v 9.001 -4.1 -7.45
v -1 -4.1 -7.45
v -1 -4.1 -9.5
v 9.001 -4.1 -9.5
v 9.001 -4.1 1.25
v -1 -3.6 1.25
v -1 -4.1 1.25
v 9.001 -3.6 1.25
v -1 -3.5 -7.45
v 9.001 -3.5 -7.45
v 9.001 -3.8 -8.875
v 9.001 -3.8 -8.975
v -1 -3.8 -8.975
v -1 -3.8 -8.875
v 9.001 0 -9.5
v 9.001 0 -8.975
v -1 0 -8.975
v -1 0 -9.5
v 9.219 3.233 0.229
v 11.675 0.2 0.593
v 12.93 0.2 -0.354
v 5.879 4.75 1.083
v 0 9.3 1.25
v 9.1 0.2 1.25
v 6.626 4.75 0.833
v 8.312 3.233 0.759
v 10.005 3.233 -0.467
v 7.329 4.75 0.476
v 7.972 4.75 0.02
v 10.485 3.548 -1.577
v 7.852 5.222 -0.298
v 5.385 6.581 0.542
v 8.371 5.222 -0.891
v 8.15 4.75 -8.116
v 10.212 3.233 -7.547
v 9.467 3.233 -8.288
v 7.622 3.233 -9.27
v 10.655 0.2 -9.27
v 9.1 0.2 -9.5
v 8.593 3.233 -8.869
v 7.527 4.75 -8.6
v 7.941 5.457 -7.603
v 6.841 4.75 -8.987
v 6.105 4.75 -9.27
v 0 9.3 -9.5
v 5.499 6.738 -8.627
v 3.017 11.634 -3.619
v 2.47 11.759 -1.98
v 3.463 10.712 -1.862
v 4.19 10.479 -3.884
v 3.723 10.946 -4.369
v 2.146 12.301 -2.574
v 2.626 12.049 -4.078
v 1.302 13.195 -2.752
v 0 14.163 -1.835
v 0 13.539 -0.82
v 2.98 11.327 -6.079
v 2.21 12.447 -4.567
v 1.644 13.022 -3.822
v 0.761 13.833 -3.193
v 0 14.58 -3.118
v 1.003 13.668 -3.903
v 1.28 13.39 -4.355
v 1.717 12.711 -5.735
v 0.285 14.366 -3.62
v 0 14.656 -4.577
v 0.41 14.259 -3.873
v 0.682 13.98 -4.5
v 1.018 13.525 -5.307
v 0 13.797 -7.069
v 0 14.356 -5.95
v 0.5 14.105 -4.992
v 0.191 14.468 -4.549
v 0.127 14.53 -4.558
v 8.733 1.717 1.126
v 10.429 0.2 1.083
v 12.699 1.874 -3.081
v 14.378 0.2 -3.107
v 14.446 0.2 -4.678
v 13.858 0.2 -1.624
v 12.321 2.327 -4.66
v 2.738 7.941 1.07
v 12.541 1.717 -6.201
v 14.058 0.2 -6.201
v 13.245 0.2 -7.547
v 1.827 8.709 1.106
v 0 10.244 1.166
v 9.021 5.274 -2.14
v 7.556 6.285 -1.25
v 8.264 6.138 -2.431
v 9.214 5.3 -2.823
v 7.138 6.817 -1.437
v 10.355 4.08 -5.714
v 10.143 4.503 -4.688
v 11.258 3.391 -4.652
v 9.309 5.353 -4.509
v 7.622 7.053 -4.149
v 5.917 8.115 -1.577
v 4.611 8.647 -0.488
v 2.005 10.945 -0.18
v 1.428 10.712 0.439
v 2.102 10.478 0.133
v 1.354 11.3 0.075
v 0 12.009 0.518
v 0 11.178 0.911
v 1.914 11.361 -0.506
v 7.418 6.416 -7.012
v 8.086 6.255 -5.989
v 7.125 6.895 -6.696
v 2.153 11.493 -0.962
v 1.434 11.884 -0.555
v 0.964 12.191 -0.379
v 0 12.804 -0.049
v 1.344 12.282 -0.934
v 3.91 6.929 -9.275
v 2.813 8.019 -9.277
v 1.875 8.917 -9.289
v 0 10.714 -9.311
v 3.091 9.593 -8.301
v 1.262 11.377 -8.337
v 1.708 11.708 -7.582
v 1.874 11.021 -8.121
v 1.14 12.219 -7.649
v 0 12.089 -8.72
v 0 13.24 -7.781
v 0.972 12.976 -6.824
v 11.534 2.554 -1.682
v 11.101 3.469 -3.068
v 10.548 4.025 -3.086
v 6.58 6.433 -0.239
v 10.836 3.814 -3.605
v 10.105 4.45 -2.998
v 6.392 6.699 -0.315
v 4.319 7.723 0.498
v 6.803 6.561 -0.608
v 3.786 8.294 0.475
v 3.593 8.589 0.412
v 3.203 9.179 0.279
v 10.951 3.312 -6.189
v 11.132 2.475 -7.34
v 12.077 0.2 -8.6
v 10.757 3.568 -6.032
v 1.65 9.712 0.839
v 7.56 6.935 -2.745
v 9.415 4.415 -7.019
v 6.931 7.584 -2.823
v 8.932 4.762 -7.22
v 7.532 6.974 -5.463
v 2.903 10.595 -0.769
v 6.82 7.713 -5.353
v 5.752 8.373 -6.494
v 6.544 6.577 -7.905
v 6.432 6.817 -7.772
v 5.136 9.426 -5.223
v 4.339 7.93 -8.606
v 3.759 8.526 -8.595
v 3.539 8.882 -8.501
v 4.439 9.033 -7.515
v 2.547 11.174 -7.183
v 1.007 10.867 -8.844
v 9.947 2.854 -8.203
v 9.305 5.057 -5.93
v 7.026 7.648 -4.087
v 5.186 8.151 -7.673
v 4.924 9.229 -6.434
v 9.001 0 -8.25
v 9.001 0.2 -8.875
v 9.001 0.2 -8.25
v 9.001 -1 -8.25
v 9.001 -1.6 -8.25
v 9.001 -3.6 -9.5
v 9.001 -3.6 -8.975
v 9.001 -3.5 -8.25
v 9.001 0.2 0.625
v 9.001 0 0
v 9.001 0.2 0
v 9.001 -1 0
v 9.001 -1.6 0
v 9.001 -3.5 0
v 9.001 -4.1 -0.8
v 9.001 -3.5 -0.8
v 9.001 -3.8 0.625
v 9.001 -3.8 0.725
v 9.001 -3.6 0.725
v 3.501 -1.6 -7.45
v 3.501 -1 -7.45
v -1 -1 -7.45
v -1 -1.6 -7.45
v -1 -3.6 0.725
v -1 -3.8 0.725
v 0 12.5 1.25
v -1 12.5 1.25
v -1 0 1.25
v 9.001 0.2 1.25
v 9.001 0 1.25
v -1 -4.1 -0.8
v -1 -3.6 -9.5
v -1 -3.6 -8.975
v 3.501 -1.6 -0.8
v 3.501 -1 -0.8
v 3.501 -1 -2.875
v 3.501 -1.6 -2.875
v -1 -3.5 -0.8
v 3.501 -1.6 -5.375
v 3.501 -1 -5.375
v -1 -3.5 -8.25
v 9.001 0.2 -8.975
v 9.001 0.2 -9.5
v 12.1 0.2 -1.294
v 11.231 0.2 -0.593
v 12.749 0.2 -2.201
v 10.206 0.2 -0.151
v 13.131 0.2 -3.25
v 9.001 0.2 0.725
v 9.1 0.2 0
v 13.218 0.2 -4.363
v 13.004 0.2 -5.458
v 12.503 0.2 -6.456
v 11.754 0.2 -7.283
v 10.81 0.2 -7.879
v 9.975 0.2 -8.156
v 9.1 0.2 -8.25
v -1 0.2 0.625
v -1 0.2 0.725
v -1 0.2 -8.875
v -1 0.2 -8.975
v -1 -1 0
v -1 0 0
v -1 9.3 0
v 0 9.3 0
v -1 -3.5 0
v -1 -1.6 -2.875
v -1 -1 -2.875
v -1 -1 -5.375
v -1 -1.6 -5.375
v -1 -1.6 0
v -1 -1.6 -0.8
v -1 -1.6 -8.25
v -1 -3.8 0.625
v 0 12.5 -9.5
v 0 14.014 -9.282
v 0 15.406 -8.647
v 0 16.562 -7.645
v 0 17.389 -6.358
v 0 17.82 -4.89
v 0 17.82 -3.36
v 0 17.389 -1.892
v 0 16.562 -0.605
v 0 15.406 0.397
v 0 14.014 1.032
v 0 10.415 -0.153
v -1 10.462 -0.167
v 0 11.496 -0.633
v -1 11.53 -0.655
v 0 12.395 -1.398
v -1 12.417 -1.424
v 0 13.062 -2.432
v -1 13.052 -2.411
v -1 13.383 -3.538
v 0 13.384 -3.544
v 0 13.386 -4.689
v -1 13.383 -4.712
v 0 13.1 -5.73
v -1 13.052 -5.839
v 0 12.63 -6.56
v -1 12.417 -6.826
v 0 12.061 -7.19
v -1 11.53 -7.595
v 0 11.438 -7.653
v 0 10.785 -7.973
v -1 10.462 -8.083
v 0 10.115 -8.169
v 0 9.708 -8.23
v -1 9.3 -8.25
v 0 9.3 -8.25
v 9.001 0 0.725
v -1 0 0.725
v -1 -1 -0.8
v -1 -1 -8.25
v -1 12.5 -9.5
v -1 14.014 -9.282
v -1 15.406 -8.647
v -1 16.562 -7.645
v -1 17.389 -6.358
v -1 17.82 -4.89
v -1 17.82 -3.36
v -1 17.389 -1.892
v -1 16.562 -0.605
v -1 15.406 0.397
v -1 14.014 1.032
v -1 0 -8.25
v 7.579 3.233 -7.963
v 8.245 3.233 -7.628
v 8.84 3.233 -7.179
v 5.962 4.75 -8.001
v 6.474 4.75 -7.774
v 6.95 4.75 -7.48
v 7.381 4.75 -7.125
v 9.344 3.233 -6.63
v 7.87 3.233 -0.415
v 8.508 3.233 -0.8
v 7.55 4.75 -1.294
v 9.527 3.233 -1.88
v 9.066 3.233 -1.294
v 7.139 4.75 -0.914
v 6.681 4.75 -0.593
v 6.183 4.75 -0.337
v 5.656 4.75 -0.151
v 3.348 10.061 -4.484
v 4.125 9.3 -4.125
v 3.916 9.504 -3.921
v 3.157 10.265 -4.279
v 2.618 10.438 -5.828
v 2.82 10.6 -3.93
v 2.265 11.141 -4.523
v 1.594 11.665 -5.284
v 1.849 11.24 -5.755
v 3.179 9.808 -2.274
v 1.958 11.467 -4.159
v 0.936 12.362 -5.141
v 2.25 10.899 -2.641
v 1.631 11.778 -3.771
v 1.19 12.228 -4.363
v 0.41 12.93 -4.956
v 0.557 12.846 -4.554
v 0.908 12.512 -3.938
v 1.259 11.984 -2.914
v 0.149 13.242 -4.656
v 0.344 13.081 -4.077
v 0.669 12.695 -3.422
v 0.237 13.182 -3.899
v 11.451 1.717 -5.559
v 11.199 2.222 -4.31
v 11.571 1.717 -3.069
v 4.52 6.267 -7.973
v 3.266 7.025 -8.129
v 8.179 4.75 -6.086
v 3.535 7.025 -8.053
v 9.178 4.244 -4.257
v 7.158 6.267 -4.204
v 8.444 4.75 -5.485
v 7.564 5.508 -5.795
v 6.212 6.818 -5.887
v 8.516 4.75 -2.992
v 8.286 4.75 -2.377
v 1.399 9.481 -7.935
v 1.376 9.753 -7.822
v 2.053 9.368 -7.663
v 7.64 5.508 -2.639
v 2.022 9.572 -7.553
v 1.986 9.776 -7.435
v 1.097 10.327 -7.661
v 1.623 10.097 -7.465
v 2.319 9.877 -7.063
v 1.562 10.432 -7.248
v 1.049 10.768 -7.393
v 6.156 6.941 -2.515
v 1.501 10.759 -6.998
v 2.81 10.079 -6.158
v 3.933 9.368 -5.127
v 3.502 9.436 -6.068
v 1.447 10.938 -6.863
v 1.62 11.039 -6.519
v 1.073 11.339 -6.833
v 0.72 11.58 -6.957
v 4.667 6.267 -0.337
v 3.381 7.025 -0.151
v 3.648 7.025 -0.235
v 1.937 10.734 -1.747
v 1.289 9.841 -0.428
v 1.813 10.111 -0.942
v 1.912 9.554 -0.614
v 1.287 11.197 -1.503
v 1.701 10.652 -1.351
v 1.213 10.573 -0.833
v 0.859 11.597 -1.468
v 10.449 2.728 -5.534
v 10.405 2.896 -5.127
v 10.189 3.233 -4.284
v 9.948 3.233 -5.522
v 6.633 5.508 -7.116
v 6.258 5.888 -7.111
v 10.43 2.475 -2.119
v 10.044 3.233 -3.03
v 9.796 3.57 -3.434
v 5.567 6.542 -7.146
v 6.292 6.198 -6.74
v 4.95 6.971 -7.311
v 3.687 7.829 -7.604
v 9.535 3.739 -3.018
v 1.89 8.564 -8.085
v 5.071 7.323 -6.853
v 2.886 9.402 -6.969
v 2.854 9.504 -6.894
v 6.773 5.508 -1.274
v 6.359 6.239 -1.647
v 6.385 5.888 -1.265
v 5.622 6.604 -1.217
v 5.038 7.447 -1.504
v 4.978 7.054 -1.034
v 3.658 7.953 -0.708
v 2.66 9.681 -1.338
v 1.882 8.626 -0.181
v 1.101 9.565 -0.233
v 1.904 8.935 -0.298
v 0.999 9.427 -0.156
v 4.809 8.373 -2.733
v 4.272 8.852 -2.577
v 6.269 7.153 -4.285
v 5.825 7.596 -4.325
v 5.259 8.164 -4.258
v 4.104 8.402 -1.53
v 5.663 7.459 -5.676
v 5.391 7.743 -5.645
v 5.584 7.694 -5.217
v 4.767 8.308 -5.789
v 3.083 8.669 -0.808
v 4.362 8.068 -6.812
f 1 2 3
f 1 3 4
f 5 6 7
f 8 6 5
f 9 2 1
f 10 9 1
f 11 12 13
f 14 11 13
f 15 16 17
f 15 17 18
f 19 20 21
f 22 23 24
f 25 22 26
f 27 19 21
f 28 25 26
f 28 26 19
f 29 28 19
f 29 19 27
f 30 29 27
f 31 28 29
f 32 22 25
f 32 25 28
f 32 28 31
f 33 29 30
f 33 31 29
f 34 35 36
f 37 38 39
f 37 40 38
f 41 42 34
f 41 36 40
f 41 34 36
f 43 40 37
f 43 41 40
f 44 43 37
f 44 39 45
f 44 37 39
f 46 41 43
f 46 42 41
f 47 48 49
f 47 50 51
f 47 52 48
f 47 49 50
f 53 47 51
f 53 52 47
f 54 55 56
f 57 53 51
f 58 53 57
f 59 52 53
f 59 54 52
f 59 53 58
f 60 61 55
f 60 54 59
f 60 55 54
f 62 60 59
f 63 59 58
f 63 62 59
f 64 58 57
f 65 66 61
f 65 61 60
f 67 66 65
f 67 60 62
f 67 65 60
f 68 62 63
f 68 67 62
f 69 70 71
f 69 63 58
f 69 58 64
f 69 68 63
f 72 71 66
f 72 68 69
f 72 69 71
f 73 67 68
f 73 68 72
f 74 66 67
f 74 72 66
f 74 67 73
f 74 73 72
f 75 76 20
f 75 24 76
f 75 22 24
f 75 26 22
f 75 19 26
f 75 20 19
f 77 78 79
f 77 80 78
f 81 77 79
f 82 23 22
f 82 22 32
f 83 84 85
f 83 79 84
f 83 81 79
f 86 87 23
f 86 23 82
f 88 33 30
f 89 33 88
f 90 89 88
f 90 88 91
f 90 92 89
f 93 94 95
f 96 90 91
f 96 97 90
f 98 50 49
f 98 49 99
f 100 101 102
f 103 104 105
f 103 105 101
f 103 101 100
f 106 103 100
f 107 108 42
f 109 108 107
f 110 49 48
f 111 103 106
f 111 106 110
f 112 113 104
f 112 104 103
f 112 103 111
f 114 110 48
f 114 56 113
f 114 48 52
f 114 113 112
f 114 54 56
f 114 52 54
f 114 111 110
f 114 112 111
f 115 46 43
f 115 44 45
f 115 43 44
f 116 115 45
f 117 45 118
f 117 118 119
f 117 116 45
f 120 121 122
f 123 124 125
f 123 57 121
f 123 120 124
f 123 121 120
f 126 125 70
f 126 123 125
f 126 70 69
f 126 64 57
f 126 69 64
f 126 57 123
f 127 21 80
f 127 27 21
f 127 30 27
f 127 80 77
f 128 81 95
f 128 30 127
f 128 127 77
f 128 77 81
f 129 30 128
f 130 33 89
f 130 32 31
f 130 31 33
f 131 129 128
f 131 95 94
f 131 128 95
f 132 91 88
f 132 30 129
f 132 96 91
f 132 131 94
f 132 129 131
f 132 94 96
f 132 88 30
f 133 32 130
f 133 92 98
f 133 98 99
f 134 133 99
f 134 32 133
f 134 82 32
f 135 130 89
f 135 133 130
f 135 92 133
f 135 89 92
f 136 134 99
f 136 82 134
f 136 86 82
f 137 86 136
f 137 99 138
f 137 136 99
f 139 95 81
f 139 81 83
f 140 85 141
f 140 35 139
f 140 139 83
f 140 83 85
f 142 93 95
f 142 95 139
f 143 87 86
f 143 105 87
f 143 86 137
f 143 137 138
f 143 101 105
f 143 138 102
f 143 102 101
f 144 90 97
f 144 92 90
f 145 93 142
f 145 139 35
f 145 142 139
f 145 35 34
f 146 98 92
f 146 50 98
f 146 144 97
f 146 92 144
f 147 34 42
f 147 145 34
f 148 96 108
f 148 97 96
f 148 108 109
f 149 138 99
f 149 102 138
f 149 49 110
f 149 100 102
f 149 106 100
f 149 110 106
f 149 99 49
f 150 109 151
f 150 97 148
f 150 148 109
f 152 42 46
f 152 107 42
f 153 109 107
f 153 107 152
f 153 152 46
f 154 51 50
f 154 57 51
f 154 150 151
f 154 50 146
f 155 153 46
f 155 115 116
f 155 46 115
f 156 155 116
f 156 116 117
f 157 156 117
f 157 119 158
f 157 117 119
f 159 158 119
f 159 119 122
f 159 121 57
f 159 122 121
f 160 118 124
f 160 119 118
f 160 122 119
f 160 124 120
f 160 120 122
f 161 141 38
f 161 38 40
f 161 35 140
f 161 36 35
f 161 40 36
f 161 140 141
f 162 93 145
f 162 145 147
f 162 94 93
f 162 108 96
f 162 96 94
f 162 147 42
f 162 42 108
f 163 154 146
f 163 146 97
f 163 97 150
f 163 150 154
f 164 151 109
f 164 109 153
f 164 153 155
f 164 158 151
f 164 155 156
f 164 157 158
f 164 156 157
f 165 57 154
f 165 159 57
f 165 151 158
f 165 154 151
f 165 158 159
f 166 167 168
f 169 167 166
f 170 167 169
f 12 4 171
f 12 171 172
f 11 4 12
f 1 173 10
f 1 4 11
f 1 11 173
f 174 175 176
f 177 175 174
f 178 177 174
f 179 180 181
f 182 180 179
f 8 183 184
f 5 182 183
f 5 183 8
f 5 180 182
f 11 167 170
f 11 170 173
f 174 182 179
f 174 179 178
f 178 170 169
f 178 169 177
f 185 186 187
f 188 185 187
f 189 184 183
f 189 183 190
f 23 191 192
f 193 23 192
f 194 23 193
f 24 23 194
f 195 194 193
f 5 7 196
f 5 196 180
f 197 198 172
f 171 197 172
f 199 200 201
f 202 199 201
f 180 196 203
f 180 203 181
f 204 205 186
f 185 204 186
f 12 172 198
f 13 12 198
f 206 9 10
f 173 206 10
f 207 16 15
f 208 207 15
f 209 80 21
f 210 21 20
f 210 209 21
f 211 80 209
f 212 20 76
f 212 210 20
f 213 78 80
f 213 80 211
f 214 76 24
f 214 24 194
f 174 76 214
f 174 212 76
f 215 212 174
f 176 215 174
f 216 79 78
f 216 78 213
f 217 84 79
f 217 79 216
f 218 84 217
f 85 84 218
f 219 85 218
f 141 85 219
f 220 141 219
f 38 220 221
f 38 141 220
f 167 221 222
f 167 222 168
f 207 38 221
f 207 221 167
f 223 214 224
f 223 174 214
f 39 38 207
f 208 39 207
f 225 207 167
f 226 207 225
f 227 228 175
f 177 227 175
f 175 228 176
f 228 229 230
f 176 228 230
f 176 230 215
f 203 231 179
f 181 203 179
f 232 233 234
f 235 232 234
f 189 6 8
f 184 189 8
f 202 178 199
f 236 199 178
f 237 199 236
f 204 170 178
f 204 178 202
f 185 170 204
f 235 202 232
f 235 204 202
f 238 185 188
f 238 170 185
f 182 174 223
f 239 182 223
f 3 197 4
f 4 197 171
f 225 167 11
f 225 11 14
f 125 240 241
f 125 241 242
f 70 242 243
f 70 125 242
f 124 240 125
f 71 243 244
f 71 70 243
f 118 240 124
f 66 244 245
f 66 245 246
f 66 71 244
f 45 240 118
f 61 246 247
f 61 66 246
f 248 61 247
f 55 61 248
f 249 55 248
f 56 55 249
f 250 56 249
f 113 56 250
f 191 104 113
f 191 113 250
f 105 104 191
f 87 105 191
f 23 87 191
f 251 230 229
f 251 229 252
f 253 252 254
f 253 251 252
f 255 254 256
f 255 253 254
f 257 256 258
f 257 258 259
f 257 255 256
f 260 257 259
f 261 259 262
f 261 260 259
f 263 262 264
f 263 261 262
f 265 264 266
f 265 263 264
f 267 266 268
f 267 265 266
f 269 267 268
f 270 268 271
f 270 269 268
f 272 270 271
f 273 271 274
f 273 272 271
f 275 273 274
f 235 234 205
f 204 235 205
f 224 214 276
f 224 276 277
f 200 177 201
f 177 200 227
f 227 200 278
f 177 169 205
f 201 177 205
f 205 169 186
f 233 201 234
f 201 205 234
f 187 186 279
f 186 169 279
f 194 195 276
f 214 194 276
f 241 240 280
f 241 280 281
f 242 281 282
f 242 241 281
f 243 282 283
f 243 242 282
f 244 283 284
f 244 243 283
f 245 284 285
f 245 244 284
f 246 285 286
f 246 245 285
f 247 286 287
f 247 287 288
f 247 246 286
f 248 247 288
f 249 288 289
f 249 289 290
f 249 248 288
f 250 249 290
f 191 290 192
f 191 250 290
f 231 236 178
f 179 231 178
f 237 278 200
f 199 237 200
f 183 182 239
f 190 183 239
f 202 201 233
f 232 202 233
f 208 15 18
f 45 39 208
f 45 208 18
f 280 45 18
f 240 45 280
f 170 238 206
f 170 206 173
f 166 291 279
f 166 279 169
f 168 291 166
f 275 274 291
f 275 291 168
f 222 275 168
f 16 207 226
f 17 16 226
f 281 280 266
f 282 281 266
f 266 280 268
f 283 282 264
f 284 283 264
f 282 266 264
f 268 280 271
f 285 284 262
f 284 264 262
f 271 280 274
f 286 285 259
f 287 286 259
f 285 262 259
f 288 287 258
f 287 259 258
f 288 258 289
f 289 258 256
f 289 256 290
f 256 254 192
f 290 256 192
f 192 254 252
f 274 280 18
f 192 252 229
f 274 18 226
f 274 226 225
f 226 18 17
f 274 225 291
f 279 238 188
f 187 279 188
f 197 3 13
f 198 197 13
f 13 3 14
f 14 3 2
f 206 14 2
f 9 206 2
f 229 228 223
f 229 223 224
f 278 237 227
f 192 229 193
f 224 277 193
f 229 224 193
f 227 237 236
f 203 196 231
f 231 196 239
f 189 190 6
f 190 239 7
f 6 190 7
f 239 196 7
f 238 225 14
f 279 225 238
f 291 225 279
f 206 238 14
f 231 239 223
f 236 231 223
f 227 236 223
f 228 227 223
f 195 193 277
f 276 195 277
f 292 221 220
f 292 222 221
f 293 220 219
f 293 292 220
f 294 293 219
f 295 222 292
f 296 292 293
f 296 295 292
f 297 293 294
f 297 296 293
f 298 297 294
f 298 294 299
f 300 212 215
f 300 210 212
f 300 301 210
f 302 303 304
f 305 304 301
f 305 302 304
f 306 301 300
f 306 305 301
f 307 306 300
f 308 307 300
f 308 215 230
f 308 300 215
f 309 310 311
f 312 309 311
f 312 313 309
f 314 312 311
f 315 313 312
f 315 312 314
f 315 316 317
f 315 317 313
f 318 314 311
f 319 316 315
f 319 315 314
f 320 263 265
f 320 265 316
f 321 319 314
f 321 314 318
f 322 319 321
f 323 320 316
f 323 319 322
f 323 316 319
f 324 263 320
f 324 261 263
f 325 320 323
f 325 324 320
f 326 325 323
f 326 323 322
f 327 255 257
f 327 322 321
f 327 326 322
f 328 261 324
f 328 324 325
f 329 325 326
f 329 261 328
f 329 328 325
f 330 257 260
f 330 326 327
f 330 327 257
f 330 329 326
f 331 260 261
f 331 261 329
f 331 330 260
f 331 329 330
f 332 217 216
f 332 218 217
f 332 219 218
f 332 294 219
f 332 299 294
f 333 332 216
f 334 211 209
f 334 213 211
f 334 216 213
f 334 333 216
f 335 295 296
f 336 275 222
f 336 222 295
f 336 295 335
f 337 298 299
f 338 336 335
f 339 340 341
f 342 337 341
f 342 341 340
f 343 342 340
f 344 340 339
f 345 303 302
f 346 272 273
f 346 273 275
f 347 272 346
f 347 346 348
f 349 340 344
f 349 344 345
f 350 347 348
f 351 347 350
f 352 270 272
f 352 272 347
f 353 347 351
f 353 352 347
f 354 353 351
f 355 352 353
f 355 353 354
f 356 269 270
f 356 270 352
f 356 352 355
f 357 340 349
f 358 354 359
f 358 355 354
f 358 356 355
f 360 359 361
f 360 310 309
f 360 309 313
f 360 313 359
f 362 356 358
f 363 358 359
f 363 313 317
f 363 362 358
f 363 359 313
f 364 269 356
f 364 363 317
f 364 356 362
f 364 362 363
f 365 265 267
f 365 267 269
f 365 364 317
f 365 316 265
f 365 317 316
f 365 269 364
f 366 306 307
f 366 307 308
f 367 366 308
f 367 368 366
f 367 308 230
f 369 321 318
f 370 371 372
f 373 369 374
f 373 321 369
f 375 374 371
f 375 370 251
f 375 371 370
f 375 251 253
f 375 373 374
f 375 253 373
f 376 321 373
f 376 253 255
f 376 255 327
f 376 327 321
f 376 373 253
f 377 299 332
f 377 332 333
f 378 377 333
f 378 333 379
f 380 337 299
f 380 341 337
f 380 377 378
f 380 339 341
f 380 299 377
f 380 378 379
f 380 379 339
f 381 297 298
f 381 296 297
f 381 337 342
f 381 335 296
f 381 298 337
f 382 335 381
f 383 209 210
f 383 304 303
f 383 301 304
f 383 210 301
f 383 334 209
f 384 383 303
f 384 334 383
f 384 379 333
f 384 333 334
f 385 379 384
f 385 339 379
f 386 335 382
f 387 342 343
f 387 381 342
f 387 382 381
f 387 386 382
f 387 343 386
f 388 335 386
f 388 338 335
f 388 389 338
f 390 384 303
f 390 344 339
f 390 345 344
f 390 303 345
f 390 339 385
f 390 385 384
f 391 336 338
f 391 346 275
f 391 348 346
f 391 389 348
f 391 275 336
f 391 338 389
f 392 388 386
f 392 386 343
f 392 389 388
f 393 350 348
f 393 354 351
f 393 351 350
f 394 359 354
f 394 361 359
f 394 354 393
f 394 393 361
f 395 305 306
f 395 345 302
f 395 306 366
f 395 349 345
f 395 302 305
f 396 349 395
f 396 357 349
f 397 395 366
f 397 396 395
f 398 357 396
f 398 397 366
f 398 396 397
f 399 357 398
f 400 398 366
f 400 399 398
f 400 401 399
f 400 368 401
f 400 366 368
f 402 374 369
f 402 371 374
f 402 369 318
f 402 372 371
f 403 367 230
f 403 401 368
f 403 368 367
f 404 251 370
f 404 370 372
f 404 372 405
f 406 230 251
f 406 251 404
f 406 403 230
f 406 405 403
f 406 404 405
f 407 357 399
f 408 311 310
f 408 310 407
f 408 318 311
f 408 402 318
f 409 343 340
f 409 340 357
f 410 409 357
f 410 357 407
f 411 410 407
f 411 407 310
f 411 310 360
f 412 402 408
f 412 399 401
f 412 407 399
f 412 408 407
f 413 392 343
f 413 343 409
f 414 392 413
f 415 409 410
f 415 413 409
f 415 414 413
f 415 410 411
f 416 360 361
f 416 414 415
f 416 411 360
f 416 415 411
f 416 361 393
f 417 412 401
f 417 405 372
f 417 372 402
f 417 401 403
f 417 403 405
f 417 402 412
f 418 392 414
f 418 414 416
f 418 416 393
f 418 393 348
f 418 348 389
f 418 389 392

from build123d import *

# Parameters (mm, degrees)
SKETCH3_W           = 22.864276312
SKETCH3_H           = 28.163711354
CUT_EXTRUDE1_DEPTH  = 24.243278598
BOSS_EXTRUDE1_DEPTH = 1
SKETCH6_W           = 10.001476891
SKETCH6_H           = 0.625
BOSS_EXTRUDE2_DEPTH = 3.6
SKETCH7_W           = 10.001476891
SKETCH7_H           = 1.25
BOSS_EXTRUDE3_DEPTH = 0.5
BOSS_EXTRUDE4_DEPTH = 0.6
SKETCH9_W           = 10.001476891
SKETCH9_H           = 0.1
CUT_EXTRUDE2_DEPTH  = 4
CUT_EXTRUDE3_DEPTH  = 0.2
SKETCH12_W          = 10.001476891
SKETCH12_H          = 0.8
BOSS_EXTRUDE5_DEPTH = 0.6


with BuildPart() as part:
    # Sweep1: sweep along a path in Sketch2
    with BuildLine(Plane.XY) as sweep1_path:
        Line((0, 0), (-15, 15))
    # Sketch1 → Sweep1 (sweep)
    with BuildSketch(Plane(origin=(0, 0, 0), x_dir=(1, 0, 0), z_dir=(0, 1, 0))):
        with BuildLine():
            Line((0, 0), (9.3, 0))
            ThreePointArc((9.3, 0), (13.425, 4.125), (9.3, 8.25))
            Line((9.3, 8.25), (0, 8.25))
            Line((0, 8.25), (0, 9.5))
            Line((0, 9.5), (9.3, 9.5))
            ThreePointArc((9.3, 9.5), (14.675, 4.125), (9.3, -1.25))
            Line((9.3, -1.25), (0, -1.25))
            Line((0, -1.25), (0, 0))
        make_face()
    sweep(path=sweep1_path.line)

    # Sketch3 → Cut-Extrude1 (cut, through all)
    with BuildSketch(Plane(origin=(0, 0, 0), x_dir=(0, 0, -1), z_dir=(-1, 0, 0))):
        with Locations((2.794700938, -13.471268798)):
            Rectangle(SKETCH3_W, SKETCH3_H)
    extrude(amount=CUT_EXTRUDE1_DEPTH, mode=Mode.SUBTRACT)

    # Sketch5 → Boss-Extrude1 (add)
    with BuildSketch(Plane(origin=(0, 0, 0), x_dir=(0, 0, -1), z_dir=(-1, 0, 0))):
        with BuildLine():
            Line((9.5, 0), (9.5, -12.5))
            ThreePointArc((9.5, -12.5), (4.125, -17.875), (-1.25, -12.5))
            Line((-1.25, -12.5), (-1.25, 0))
            Line((-1.25, 0), (0, 0))
            Line((0, 0), (0, -9.3))
            ThreePointArc((0, -9.3), (4.125, -13.425), (8.25, -9.3))
            Line((8.25, -9.3), (8.25, 0))
            Line((8.25, 0), (9.5, 0))
        make_face()
    extrude(amount=BOSS_EXTRUDE1_DEPTH)

    # Sketch6 → Boss-Extrude2 (add)
    with BuildSketch(Plane.XZ):
        with Locations((4.000738446, -8.5625)):
            Rectangle(SKETCH6_W, SKETCH6_H)
        with Locations((4.000738446, 0.3125)):
            Rectangle(SKETCH6_W, SKETCH6_H)
    extrude(amount=BOSS_EXTRUDE2_DEPTH)

    # Sketch7 → Boss-Extrude3 (add)
    with BuildSketch(Plane.XZ.offset(3.6)):
        with Locations((4.000738446, 0.625)):
            Rectangle(SKETCH7_W, SKETCH7_H)
        with Locations((4.000738446, -8.875)):
            Rectangle(SKETCH7_W, SKETCH7_H)
    extrude(amount=BOSS_EXTRUDE3_DEPTH)

    # Sketch8 → Boss-Extrude4 (add)
    with BuildSketch(Plane(origin=(0, -1, 0), x_dir=(-1, 0, 0), z_dir=(0, -1, 0))):
        Polygon((-9.001476891, 8.25), (-9.001476891, 0), (-3.501476891, 0), (1, 0), (1, 0.8), (-3.501476891, 0.8), (-3.501476891, 2.875), (1, 2.875), (1, 5.375), (-3.501476891, 5.375), (-3.501476891, 7.45), (1, 7.45), (1, 8.25), (-3.501476891, 8.25), align=None)
    extrude(amount=BOSS_EXTRUDE4_DEPTH)

    # Sketch9 → Cut-Extrude2 (cut)
    with BuildSketch(Plane(origin=(0, 0.2, 0), x_dir=(-1, 0, 0), z_dir=(0, -1, 0))):
        with Locations((-4.000738446, -0.675)):
            Rectangle(SKETCH9_W, SKETCH9_H)
        with Locations((-4.000738446, 8.925)):
            Rectangle(SKETCH9_W, SKETCH9_H)
    extrude(amount=CUT_EXTRUDE2_DEPTH, mode=Mode.SUBTRACT)

    # Sketch10 → Cut-Extrude3 (cut)
    with BuildSketch(Plane.XZ):
        Polygon((9.001476891, 0.725), (9.001476891, -8.875), (9.001476891, -10.300951844), (15.96659325, -10.300951844), (15.96659325, 1.743519047), (9.001476891, 1.743519047), align=None)
    extrude(amount=-CUT_EXTRUDE3_DEPTH, mode=Mode.SUBTRACT)

    # Sketch12 → Boss-Extrude5 (add)
    with BuildSketch(Plane.XZ.offset(4.1)):
        with Locations((4.000738446, -7.85)):
            Rectangle(SKETCH12_W, SKETCH12_H)
        with Locations((4.000738446, -0.4)):
            Rectangle(SKETCH12_W, SKETCH12_H)
    extrude(amount=-BOSS_EXTRUDE5_DEPTH)


solid = part.part
